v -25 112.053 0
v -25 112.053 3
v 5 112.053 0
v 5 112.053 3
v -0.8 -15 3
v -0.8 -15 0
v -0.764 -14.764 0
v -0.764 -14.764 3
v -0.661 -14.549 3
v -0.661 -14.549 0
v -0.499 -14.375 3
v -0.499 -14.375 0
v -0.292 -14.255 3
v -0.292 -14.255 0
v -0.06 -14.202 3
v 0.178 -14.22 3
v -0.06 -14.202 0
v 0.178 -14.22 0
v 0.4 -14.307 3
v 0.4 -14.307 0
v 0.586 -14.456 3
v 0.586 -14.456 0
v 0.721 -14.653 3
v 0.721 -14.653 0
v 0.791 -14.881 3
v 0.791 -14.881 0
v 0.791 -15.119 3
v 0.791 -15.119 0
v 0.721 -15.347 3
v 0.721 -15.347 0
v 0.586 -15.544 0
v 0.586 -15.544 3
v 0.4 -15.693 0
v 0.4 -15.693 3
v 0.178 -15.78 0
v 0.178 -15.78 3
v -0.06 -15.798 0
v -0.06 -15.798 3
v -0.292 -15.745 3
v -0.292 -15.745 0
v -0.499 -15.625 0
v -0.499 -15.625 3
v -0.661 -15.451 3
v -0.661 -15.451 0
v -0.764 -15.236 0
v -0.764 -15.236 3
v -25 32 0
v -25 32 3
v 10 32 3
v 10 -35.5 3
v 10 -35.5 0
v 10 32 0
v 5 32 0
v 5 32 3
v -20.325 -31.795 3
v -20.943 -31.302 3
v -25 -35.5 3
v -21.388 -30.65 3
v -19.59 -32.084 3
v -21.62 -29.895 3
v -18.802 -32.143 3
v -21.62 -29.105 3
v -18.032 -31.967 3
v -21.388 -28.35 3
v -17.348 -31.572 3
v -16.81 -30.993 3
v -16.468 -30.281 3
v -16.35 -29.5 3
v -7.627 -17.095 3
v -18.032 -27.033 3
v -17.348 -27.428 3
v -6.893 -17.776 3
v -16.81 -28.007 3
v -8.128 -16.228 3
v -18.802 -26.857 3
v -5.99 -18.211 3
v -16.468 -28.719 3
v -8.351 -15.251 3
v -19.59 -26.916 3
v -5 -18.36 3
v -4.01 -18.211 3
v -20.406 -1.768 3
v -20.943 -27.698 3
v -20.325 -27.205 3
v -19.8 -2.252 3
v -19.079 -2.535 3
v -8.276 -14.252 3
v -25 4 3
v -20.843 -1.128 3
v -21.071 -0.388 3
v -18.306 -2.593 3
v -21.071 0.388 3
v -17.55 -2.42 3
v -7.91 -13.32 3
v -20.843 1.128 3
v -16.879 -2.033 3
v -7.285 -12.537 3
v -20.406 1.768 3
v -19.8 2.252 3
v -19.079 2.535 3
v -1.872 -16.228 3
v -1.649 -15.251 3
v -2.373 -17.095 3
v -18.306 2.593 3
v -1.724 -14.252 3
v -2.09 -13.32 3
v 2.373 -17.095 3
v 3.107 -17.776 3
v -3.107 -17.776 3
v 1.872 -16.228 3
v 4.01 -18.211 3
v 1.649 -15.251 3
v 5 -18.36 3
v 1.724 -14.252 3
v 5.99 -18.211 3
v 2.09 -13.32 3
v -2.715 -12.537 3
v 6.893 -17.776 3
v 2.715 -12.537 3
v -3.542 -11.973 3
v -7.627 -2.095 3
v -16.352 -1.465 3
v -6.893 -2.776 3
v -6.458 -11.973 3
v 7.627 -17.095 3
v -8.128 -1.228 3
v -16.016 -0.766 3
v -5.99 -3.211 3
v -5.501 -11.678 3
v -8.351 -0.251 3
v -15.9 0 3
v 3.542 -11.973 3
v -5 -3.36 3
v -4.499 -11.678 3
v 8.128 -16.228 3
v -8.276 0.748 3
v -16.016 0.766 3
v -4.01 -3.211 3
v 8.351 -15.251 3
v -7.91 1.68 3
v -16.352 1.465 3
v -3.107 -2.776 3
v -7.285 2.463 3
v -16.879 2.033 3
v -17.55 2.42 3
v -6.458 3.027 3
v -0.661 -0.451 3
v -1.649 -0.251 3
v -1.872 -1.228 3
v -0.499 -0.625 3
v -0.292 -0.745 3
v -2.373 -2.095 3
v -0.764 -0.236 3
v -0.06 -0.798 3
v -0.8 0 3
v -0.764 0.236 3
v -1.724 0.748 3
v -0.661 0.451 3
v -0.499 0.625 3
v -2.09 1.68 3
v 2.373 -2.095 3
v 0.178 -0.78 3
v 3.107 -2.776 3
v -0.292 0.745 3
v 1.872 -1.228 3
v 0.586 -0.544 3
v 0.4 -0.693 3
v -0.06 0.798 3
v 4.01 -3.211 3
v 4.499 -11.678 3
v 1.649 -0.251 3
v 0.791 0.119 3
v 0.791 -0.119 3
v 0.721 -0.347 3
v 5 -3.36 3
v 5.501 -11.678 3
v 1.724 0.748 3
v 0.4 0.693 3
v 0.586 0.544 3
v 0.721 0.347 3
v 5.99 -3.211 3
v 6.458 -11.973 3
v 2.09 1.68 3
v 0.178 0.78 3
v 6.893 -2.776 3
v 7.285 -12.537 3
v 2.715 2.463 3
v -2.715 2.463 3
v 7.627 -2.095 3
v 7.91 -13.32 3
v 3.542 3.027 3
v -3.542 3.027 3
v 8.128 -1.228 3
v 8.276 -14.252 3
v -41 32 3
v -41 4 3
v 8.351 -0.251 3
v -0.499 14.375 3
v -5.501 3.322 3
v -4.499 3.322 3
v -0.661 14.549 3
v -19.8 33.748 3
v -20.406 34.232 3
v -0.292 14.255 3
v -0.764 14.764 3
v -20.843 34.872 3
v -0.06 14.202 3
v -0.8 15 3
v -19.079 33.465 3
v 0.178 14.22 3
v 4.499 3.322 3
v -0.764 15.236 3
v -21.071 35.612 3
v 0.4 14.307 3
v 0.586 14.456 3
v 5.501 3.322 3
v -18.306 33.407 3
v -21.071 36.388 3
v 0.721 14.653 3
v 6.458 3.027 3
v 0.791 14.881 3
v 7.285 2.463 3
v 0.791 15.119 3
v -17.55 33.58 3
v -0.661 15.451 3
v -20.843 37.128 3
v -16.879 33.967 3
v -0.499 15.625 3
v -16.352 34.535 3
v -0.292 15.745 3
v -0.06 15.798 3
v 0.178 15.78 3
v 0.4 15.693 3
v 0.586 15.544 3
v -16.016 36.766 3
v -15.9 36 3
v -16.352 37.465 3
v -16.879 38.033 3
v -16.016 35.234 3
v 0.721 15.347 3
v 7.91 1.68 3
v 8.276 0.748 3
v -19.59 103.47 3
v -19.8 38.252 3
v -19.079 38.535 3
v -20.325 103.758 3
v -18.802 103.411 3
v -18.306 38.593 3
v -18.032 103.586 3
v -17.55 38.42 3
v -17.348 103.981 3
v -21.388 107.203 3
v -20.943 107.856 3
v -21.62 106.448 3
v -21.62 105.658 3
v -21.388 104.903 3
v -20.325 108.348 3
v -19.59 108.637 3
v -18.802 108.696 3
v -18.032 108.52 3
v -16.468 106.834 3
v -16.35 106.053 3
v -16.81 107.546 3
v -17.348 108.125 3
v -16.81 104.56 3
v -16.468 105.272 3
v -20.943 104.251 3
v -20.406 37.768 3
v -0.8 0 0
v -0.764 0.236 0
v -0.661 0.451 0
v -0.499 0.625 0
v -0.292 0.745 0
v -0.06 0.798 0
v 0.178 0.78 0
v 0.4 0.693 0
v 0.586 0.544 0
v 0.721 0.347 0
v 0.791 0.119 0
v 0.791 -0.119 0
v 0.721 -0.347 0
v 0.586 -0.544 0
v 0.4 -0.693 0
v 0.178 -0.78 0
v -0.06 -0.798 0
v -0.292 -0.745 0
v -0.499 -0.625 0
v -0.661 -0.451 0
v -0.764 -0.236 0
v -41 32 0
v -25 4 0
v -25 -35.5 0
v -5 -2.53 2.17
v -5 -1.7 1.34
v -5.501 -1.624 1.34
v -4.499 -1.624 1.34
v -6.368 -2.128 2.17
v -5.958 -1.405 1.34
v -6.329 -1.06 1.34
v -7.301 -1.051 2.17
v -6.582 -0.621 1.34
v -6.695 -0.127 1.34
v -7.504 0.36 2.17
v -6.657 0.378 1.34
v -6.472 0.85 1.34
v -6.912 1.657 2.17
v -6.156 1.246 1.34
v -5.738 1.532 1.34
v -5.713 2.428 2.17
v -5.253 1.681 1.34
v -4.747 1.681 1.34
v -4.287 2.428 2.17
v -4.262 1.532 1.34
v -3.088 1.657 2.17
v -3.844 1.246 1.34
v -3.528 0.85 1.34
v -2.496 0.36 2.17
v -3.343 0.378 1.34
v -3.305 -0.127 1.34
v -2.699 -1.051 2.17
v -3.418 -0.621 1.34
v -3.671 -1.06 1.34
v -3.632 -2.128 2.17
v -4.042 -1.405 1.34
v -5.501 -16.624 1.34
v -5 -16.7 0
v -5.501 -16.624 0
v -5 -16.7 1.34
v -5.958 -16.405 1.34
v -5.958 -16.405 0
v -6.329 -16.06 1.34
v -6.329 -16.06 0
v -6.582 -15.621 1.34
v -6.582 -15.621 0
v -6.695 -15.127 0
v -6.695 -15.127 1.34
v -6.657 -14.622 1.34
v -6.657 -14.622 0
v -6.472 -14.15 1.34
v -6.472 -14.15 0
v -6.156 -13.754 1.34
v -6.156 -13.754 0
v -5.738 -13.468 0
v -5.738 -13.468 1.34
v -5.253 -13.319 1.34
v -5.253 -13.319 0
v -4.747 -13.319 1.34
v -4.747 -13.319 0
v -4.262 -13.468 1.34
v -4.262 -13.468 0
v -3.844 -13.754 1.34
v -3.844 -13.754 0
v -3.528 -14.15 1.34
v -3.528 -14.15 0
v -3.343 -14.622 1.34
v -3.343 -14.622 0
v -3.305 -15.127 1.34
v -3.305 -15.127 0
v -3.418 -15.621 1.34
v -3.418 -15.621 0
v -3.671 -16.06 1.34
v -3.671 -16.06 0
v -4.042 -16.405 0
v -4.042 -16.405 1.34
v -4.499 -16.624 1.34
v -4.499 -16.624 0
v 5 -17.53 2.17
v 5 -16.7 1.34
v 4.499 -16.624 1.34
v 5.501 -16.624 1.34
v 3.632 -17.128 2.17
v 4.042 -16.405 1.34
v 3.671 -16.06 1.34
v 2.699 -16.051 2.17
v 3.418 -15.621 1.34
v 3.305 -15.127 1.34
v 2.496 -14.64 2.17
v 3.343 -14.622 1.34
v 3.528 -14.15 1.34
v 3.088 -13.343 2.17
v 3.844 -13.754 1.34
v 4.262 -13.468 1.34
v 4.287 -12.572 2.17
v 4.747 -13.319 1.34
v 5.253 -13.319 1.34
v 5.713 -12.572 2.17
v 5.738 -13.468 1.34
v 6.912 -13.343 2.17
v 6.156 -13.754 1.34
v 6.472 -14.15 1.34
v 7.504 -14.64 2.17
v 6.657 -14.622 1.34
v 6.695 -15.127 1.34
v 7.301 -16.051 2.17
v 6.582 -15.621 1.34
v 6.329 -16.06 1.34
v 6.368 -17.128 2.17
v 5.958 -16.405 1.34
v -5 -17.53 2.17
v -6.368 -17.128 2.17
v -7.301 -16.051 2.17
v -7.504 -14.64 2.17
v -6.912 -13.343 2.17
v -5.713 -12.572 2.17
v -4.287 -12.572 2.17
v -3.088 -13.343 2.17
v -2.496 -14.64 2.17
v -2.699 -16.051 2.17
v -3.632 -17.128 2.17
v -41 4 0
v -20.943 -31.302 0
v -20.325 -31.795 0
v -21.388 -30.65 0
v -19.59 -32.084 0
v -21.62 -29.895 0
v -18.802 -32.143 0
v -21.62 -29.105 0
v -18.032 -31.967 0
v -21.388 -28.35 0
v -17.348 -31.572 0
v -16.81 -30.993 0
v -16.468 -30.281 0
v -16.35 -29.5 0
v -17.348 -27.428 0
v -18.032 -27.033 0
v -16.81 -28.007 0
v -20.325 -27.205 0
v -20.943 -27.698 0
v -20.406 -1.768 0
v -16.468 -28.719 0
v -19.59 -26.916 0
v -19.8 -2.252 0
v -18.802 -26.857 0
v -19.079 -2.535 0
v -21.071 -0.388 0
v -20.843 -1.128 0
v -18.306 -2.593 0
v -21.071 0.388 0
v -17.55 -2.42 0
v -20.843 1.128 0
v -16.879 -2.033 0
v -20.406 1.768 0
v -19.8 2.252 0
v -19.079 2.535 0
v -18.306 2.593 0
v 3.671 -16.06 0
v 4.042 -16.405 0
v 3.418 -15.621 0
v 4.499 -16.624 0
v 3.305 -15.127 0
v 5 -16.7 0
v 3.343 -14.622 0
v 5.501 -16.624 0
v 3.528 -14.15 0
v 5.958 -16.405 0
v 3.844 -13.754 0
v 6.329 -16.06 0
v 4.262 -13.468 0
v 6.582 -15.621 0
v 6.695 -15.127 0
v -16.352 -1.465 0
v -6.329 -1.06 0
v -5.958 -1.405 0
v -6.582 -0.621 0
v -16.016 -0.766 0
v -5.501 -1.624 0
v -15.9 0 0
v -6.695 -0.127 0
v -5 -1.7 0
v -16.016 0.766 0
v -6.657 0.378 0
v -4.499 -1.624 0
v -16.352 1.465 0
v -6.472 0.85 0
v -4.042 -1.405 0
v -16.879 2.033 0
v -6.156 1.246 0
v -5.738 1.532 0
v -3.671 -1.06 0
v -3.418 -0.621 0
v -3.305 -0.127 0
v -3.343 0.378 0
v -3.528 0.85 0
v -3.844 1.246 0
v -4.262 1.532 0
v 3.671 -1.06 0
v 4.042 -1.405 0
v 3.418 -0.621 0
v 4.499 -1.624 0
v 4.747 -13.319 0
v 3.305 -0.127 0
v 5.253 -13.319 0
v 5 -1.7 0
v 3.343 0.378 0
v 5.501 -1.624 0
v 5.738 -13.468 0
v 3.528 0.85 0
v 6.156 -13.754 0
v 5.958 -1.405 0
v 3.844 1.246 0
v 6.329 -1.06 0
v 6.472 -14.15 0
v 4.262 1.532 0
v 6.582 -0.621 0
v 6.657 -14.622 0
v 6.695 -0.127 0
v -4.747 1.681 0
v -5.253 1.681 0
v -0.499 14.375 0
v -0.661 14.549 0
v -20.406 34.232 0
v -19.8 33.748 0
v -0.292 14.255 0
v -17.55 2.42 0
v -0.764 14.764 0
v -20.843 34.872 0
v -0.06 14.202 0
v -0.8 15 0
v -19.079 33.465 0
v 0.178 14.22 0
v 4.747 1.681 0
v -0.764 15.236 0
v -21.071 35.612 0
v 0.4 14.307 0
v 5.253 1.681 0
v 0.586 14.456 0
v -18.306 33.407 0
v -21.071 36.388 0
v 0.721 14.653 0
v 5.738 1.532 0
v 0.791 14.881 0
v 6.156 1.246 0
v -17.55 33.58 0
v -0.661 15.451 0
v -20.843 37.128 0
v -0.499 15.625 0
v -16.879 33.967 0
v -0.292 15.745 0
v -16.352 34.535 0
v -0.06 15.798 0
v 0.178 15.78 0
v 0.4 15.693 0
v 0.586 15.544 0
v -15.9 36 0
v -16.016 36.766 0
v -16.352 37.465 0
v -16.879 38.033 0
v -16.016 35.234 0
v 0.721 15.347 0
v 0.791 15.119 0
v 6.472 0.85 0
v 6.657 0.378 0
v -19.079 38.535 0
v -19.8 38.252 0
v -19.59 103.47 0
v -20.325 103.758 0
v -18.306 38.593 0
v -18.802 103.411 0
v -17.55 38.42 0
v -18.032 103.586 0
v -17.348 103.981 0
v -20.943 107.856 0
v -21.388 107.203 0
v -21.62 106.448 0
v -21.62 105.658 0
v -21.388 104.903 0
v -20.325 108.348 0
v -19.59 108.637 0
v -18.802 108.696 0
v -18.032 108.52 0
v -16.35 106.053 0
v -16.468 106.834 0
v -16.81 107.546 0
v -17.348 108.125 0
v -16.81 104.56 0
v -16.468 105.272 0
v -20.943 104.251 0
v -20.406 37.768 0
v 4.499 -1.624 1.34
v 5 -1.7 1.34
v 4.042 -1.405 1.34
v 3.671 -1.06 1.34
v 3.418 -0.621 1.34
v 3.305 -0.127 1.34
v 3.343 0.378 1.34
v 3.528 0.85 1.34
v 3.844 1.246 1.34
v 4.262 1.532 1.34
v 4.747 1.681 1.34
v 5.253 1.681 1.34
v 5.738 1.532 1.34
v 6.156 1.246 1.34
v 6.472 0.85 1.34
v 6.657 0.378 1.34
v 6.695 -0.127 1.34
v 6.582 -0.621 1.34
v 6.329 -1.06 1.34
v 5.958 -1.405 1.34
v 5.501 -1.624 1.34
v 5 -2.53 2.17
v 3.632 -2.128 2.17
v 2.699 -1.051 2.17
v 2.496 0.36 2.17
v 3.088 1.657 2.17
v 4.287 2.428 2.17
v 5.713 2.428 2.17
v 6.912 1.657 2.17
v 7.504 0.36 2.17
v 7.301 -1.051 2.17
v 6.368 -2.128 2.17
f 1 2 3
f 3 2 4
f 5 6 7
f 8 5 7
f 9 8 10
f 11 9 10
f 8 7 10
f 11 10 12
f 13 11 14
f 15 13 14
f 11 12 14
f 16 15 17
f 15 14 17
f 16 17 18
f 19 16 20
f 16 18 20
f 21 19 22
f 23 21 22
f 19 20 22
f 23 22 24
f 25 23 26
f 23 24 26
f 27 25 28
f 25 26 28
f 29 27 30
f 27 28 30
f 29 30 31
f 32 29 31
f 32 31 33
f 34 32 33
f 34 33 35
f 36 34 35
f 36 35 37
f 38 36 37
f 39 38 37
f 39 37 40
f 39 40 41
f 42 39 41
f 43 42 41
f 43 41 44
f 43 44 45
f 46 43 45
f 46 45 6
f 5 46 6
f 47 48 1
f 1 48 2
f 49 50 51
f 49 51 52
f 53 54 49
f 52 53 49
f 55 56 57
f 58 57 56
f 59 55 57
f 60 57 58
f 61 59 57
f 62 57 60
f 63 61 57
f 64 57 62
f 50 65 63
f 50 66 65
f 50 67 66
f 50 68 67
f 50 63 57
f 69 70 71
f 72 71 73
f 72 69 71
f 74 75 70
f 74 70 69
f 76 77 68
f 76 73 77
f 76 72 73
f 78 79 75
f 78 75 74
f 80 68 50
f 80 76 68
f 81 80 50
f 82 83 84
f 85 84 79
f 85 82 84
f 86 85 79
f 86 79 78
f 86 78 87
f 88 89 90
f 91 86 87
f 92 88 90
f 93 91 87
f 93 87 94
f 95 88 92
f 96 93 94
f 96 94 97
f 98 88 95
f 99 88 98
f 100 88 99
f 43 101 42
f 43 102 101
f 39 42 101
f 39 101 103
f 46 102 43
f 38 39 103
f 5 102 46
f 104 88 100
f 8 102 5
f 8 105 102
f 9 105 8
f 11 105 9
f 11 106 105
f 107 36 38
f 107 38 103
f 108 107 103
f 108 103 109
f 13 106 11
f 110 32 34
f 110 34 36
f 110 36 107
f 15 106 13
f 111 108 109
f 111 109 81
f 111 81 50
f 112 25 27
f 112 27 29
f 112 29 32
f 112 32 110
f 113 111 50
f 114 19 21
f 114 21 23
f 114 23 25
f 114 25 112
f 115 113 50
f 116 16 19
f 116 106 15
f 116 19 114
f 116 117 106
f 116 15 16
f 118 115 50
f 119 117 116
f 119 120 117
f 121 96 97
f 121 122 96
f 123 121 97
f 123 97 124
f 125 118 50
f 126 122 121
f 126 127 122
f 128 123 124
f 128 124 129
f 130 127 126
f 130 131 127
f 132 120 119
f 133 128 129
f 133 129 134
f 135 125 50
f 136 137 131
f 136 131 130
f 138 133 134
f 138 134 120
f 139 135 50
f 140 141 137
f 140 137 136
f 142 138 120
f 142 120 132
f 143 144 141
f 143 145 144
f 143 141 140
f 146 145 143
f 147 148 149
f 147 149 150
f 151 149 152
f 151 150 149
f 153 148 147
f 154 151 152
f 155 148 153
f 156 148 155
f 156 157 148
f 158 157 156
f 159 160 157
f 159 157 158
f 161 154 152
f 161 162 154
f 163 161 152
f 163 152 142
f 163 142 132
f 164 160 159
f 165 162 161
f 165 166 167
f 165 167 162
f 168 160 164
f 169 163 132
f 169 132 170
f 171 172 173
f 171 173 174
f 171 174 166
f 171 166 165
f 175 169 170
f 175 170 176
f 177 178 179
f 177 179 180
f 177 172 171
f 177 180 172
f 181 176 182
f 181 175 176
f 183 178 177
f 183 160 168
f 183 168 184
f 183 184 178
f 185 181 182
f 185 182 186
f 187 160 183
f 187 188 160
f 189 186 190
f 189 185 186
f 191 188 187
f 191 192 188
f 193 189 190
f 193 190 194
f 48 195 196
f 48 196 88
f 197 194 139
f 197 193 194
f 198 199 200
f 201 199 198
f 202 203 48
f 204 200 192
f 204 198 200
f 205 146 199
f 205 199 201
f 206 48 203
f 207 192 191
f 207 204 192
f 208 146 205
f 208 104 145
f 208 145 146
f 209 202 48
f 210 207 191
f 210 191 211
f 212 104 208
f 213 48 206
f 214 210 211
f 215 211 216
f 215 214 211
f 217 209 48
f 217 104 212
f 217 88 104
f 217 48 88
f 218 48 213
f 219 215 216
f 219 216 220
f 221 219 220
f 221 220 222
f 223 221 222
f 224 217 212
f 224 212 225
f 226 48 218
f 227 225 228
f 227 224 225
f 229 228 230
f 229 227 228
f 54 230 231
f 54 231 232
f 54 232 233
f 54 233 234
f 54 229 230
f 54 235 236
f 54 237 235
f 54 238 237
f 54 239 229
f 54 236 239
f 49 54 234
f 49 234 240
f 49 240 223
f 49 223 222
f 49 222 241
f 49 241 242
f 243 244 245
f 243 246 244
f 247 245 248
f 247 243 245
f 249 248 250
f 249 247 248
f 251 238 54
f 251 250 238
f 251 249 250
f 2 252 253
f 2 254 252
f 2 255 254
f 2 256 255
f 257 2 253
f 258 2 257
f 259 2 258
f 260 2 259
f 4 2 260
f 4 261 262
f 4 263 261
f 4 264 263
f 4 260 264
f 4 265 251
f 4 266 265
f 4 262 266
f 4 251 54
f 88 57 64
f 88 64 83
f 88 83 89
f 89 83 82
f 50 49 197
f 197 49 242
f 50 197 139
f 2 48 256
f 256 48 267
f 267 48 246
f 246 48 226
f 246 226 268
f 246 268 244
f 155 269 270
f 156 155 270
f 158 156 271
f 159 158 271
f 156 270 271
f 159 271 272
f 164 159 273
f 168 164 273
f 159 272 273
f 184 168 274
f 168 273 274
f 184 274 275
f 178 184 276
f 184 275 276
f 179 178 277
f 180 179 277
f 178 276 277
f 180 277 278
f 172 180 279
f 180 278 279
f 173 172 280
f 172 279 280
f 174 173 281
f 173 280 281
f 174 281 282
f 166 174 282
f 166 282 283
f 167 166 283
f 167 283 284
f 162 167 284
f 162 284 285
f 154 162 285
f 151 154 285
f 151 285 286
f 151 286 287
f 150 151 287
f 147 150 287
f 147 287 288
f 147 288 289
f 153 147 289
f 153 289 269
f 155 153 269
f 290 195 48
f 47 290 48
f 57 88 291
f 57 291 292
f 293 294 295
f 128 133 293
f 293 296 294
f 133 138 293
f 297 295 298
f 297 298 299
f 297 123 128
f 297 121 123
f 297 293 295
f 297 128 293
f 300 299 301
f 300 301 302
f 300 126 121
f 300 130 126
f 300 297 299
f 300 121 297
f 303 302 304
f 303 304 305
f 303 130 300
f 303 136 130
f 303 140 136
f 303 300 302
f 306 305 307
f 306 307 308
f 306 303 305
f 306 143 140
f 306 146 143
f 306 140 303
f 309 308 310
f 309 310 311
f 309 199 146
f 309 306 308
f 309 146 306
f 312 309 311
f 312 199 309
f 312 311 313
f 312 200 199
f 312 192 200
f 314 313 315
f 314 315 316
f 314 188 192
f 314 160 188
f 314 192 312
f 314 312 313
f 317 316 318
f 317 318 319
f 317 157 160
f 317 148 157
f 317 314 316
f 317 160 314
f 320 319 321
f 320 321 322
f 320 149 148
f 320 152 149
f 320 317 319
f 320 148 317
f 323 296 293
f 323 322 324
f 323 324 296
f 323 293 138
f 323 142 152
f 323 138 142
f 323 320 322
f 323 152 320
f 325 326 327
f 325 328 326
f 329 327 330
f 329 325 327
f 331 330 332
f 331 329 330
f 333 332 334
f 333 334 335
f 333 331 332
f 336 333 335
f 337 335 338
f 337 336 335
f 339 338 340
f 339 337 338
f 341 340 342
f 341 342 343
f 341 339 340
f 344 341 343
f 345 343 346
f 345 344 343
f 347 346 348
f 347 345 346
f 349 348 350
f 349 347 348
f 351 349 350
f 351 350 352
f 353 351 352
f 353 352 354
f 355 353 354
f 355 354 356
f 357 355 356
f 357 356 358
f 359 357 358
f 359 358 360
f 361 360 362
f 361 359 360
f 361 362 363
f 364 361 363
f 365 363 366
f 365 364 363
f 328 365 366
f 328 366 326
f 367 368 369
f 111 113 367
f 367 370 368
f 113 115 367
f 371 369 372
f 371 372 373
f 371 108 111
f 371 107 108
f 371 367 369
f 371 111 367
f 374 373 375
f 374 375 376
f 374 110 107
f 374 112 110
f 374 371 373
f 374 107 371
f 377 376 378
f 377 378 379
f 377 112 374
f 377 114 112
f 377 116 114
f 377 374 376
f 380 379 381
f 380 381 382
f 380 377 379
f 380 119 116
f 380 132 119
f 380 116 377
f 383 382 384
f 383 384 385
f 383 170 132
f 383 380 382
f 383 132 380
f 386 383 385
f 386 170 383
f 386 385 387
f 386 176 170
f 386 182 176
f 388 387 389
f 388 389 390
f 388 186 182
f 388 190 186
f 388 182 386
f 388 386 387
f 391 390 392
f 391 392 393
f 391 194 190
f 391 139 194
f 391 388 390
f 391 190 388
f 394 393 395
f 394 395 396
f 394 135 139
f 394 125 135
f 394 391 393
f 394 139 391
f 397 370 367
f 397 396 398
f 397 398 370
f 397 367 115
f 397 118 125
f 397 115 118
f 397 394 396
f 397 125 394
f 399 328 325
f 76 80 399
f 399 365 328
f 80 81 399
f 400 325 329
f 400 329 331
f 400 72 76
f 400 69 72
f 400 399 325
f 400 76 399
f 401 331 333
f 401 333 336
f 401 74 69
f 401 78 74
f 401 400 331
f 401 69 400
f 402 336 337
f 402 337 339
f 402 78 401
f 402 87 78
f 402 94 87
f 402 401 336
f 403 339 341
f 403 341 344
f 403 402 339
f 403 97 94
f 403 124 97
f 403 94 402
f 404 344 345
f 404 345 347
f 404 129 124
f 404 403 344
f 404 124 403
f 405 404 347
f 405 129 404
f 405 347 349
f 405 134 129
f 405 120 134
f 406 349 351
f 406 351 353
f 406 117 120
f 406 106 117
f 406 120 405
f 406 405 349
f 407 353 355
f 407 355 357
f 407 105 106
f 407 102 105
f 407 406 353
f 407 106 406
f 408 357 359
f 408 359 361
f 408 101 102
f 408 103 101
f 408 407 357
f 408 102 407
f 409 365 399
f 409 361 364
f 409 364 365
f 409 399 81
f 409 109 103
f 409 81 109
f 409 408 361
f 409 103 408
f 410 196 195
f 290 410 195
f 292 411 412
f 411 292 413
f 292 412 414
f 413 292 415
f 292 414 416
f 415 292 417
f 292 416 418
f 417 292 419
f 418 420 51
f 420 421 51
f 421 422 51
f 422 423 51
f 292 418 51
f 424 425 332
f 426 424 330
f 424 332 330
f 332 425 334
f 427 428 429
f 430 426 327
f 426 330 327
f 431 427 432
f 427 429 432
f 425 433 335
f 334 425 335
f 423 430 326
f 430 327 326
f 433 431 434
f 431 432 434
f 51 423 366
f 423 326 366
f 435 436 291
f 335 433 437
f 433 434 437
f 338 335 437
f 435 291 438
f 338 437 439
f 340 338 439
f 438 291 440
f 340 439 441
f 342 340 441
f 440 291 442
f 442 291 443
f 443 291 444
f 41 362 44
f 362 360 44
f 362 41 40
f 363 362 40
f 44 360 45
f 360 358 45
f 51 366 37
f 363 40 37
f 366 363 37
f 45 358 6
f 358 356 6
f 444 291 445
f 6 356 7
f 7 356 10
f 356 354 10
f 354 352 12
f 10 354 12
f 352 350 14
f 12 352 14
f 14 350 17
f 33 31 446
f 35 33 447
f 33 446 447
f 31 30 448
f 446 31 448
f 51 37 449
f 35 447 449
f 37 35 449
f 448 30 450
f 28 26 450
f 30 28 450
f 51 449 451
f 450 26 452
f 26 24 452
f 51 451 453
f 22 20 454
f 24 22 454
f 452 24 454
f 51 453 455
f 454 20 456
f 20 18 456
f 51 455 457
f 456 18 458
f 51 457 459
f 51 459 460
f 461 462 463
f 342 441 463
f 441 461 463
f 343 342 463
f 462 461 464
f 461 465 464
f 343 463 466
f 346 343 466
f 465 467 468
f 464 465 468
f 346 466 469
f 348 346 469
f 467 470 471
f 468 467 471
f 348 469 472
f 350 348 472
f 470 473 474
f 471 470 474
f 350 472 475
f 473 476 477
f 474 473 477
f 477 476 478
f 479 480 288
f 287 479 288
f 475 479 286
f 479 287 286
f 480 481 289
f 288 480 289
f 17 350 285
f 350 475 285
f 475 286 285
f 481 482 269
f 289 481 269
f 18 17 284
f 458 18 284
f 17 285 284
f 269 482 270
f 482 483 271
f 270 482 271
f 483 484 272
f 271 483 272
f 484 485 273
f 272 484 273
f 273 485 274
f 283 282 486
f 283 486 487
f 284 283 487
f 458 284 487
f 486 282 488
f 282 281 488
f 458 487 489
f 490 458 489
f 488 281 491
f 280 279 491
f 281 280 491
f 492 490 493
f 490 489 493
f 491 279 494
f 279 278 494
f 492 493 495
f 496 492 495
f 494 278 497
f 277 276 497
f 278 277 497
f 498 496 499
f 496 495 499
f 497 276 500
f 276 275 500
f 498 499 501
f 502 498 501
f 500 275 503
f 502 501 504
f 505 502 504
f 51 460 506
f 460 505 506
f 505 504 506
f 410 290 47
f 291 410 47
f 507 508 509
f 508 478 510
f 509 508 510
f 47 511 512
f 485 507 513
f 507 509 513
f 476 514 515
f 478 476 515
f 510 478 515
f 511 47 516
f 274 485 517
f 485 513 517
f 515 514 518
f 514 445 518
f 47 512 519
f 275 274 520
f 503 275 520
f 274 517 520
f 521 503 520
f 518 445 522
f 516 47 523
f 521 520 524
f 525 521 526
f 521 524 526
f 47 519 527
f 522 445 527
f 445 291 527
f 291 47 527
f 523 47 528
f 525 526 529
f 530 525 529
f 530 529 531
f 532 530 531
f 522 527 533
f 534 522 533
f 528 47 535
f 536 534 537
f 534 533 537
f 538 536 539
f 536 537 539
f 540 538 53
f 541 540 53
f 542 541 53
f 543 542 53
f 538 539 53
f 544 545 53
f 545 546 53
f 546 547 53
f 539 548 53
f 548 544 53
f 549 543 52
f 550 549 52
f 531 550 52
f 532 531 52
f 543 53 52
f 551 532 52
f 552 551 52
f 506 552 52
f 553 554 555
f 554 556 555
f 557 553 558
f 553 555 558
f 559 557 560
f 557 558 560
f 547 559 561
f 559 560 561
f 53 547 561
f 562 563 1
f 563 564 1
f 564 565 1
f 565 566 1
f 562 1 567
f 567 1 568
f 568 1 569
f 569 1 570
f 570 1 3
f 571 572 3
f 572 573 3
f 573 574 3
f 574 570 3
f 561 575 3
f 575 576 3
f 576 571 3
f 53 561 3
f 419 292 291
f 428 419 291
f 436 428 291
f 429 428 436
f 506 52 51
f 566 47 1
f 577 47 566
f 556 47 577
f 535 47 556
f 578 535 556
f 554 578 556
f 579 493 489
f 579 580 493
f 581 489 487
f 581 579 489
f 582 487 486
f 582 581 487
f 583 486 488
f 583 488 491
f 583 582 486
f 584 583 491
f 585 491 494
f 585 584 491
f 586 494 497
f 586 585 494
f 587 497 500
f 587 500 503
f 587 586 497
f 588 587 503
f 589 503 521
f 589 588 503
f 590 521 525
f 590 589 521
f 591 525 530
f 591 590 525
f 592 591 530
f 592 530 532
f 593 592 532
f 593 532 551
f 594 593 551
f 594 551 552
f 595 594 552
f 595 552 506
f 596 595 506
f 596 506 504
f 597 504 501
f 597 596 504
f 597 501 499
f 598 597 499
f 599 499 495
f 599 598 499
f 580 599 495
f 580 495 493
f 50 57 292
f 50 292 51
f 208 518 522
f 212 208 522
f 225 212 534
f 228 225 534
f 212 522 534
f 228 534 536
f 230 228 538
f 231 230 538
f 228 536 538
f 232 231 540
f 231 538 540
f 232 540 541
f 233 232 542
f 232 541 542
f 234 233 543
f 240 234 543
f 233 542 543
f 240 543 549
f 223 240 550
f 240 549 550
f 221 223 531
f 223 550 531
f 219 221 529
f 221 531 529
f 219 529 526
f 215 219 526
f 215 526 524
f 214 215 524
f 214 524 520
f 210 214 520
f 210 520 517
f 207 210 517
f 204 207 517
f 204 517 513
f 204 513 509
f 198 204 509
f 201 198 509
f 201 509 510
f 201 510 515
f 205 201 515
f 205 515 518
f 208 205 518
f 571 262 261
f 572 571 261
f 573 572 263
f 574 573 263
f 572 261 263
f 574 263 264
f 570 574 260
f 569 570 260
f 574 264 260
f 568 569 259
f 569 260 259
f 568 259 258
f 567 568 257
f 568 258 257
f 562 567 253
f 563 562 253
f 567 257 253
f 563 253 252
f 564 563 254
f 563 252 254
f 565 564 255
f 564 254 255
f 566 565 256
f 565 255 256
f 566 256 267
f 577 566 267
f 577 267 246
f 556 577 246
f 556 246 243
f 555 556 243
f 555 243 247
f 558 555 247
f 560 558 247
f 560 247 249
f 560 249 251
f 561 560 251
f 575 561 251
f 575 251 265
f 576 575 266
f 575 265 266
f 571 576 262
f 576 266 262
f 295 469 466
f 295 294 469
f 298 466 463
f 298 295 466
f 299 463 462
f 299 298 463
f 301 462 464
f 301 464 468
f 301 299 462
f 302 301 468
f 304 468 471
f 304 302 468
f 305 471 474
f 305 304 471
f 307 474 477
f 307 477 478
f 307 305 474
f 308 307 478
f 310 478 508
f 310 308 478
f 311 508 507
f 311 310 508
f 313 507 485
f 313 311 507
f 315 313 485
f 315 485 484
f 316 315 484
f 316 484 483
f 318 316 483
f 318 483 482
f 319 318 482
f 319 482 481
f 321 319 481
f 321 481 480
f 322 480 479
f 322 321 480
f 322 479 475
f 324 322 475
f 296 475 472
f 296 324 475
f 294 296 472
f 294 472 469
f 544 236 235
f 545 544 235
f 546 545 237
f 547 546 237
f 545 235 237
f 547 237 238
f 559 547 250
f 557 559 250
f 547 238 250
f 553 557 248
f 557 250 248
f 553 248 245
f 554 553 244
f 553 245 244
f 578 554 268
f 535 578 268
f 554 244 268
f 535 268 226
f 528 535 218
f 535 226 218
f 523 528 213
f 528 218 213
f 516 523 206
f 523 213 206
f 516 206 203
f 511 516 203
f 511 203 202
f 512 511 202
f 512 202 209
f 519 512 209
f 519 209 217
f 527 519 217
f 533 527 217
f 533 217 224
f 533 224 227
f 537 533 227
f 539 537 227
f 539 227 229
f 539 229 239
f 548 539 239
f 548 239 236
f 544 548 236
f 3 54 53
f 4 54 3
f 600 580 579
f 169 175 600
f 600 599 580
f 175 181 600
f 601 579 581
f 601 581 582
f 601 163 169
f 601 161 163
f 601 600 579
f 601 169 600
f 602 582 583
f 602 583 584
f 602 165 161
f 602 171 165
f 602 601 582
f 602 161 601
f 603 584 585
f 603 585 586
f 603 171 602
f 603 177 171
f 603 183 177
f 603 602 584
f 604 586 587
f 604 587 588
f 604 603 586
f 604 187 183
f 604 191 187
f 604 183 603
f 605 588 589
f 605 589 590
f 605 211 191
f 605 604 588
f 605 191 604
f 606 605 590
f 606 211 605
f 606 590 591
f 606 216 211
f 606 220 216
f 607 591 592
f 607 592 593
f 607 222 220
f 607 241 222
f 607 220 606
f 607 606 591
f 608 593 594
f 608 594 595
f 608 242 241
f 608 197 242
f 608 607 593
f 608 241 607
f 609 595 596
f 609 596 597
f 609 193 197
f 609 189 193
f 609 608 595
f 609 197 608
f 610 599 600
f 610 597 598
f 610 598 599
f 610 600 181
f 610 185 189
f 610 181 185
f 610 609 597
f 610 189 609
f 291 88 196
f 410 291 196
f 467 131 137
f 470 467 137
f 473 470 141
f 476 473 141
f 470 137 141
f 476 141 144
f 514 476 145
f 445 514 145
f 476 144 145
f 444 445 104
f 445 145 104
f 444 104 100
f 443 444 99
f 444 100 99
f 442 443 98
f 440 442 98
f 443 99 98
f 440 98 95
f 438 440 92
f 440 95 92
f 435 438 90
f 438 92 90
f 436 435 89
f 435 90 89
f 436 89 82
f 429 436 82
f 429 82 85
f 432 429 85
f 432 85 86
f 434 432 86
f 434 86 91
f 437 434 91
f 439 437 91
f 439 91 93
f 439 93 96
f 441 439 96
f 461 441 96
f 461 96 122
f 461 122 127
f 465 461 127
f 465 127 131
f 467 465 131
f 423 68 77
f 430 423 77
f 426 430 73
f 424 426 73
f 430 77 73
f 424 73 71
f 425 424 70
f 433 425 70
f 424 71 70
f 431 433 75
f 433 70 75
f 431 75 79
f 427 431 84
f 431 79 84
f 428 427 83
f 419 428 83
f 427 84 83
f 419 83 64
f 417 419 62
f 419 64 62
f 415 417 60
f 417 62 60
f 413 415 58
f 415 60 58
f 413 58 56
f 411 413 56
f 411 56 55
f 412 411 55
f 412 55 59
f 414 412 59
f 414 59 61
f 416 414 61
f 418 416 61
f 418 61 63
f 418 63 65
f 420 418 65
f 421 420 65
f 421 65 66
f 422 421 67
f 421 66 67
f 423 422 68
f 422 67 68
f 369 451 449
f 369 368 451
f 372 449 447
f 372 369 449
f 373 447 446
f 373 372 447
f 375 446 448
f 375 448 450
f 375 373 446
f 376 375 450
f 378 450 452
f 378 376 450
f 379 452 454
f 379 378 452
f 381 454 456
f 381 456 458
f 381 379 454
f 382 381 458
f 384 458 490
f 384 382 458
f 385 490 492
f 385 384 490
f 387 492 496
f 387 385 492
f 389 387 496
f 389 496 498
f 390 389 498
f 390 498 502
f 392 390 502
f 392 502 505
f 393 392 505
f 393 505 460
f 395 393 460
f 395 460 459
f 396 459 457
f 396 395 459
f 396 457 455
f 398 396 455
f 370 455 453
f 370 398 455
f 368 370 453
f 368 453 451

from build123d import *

# Parameters (mm, degrees)
SKETCH1_W                                    = 20
SKETCH1_H                                    = 40
BOSS_EXTRUDE1_DEPTH                          = 3
CSK_FOR_M3_HEX_SOCKET_COUNTERSUNK_CA_2_COUNT = 2
CSK_FOR_M3_HEX_SOCKET_COUNTERSUNK_CA_2_PITCH = 10
CSK_FOR_M3_HEX_SOCKET_COUNTERSUNK_CA_3_COUNT = 2
CSK_FOR_M3_HEX_SOCKET_COUNTERSUNK_CA_3_PITCH = 18.027756377
CSK_FOR_M3_HEX_SOCKET_COUNTERSUNK_CA_4_COUNT = 2
CSK_FOR_M3_HEX_SOCKET_COUNTERSUNK_CA_4_PITCH = 15
M2_TAPPED_HOLE1_D                            = 1.6
BOSS_EXTRUDE2_DEPTH                          = 3
SKETCH7_W                                    = 30
SKETCH7_H                                    = 80.053183591
SKETCH7_R                                    = 2.65
BOSS_EXTRUDE3_DEPTH                          = 3
SKETCH8_R                                    = 2.65
BOSS_EXTRUDE4_DEPTH                          = 3
SKETCH9_R                                    = 2.6
CUT_EXTRUDE1_DEPTH                           = 4


with BuildPart() as part:
    # Sketch1 → Boss-Extrude1 (new body)
    with BuildSketch(Plane.XY):
        Rectangle(SKETCH1_W, SKETCH1_H)
    extrude(amount=BOSS_EXTRUDE1_DEPTH)

    # Sketch3 → CSK for M3 Hex Socket Countersunk Cap Screw1 (revolve, cut)
    with BuildSketch(Plane(origin=(-5, 0, 3), x_dir=(0, -1, 0), z_dir=(1, 0, 0))):
        Polygon((0, 0), (0, 3), (1.7, 3), (1.7, 1.66), (3.36, 0), align=None)
    csk_for_m3_hex_socket_countersunk_cap_sc = revolve(axis=Axis((-5, 0, 9.35), (0, 0, -1)), mode=Mode.SUBTRACT)

    # CSK for M3 Hex Socket Countersunk Ca 2: CSK for M3 Hex Socket Countersunk Cap Screw1 ×2
    with Locations(*[(i * CSK_FOR_M3_HEX_SOCKET_COUNTERSUNK_CA_2_PITCH, 0, 0) for i in range(1, CSK_FOR_M3_HEX_SOCKET_COUNTERSUNK_CA_2_COUNT)]):
        add(csk_for_m3_hex_socket_countersunk_cap_sc, mode=Mode.SUBTRACT)

    # CSK for M3 Hex Socket Countersunk Ca 3: CSK for M3 Hex Socket Countersunk Cap Screw1 ×2
    with Locations(*[Vector(0.554700196, -0.832050294, 0) * (i * CSK_FOR_M3_HEX_SOCKET_COUNTERSUNK_CA_3_PITCH) for i in range(1, CSK_FOR_M3_HEX_SOCKET_COUNTERSUNK_CA_3_COUNT)]):
        add(csk_for_m3_hex_socket_countersunk_cap_sc, mode=Mode.SUBTRACT)

    # CSK for M3 Hex Socket Countersunk Ca 4: CSK for M3 Hex Socket Countersunk Cap Screw1 ×2
    with Locations(*[(0, -i * CSK_FOR_M3_HEX_SOCKET_COUNTERSUNK_CA_4_PITCH, 0) for i in range(1, CSK_FOR_M3_HEX_SOCKET_COUNTERSUNK_CA_4_COUNT)]):
        add(csk_for_m3_hex_socket_countersunk_cap_sc, mode=Mode.SUBTRACT)

    # M2 Tapped Hole1 (through all)
    with Locations(Plane.XY.offset(3)):
        with Locations((0, 15), (0, 0), (0, -15)):
            Hole(M2_TAPPED_HOLE1_D / 2)

    # Sketch6 → Boss-Extrude2 (add)
    with BuildSketch(Plane.XY.offset(3)):
        Polygon((-10, 4), (-41, 4), (-41, 32), (10, 32), (10, 20), (-10, 20), align=None)
    extrude(amount=-BOSS_EXTRUDE2_DEPTH)

    # Sketch7 → Boss-Extrude3 (add)
    with BuildSketch(Plane.XY.offset(3)):
        with Locations((-10, 72.026591795)):
            Rectangle(SKETCH7_W, SKETCH7_H)
        with Locations((-19, 106.053183591)):
            Circle(SKETCH7_R, mode=Mode.SUBTRACT)
    extrude(amount=-BOSS_EXTRUDE3_DEPTH)

    # Sketch8 → Boss-Extrude4 (add)
    with BuildSketch(Plane.XY.offset(3)):
        Polygon((-25, 4), (-25, -35.5), (10, -35.5), (10, -20), (-10, -20), (-10, 4), align=None)
        with Locations((-19, -29.5)):
            Circle(SKETCH8_R, mode=Mode.SUBTRACT)
    extrude(amount=-BOSS_EXTRUDE4_DEPTH)

    # Sketch9 → Cut-Extrude1 (cut, through all)
    with BuildSketch(Plane.XY.offset(3)):
        with Locations((-18.5, 0)):
            Circle(SKETCH9_R)
        with Locations((-18.5, 36)):
            Circle(SKETCH9_R)
    extrude(amount=-CUT_EXTRUDE1_DEPTH, mode=Mode.SUBTRACT)


solid = part.part
